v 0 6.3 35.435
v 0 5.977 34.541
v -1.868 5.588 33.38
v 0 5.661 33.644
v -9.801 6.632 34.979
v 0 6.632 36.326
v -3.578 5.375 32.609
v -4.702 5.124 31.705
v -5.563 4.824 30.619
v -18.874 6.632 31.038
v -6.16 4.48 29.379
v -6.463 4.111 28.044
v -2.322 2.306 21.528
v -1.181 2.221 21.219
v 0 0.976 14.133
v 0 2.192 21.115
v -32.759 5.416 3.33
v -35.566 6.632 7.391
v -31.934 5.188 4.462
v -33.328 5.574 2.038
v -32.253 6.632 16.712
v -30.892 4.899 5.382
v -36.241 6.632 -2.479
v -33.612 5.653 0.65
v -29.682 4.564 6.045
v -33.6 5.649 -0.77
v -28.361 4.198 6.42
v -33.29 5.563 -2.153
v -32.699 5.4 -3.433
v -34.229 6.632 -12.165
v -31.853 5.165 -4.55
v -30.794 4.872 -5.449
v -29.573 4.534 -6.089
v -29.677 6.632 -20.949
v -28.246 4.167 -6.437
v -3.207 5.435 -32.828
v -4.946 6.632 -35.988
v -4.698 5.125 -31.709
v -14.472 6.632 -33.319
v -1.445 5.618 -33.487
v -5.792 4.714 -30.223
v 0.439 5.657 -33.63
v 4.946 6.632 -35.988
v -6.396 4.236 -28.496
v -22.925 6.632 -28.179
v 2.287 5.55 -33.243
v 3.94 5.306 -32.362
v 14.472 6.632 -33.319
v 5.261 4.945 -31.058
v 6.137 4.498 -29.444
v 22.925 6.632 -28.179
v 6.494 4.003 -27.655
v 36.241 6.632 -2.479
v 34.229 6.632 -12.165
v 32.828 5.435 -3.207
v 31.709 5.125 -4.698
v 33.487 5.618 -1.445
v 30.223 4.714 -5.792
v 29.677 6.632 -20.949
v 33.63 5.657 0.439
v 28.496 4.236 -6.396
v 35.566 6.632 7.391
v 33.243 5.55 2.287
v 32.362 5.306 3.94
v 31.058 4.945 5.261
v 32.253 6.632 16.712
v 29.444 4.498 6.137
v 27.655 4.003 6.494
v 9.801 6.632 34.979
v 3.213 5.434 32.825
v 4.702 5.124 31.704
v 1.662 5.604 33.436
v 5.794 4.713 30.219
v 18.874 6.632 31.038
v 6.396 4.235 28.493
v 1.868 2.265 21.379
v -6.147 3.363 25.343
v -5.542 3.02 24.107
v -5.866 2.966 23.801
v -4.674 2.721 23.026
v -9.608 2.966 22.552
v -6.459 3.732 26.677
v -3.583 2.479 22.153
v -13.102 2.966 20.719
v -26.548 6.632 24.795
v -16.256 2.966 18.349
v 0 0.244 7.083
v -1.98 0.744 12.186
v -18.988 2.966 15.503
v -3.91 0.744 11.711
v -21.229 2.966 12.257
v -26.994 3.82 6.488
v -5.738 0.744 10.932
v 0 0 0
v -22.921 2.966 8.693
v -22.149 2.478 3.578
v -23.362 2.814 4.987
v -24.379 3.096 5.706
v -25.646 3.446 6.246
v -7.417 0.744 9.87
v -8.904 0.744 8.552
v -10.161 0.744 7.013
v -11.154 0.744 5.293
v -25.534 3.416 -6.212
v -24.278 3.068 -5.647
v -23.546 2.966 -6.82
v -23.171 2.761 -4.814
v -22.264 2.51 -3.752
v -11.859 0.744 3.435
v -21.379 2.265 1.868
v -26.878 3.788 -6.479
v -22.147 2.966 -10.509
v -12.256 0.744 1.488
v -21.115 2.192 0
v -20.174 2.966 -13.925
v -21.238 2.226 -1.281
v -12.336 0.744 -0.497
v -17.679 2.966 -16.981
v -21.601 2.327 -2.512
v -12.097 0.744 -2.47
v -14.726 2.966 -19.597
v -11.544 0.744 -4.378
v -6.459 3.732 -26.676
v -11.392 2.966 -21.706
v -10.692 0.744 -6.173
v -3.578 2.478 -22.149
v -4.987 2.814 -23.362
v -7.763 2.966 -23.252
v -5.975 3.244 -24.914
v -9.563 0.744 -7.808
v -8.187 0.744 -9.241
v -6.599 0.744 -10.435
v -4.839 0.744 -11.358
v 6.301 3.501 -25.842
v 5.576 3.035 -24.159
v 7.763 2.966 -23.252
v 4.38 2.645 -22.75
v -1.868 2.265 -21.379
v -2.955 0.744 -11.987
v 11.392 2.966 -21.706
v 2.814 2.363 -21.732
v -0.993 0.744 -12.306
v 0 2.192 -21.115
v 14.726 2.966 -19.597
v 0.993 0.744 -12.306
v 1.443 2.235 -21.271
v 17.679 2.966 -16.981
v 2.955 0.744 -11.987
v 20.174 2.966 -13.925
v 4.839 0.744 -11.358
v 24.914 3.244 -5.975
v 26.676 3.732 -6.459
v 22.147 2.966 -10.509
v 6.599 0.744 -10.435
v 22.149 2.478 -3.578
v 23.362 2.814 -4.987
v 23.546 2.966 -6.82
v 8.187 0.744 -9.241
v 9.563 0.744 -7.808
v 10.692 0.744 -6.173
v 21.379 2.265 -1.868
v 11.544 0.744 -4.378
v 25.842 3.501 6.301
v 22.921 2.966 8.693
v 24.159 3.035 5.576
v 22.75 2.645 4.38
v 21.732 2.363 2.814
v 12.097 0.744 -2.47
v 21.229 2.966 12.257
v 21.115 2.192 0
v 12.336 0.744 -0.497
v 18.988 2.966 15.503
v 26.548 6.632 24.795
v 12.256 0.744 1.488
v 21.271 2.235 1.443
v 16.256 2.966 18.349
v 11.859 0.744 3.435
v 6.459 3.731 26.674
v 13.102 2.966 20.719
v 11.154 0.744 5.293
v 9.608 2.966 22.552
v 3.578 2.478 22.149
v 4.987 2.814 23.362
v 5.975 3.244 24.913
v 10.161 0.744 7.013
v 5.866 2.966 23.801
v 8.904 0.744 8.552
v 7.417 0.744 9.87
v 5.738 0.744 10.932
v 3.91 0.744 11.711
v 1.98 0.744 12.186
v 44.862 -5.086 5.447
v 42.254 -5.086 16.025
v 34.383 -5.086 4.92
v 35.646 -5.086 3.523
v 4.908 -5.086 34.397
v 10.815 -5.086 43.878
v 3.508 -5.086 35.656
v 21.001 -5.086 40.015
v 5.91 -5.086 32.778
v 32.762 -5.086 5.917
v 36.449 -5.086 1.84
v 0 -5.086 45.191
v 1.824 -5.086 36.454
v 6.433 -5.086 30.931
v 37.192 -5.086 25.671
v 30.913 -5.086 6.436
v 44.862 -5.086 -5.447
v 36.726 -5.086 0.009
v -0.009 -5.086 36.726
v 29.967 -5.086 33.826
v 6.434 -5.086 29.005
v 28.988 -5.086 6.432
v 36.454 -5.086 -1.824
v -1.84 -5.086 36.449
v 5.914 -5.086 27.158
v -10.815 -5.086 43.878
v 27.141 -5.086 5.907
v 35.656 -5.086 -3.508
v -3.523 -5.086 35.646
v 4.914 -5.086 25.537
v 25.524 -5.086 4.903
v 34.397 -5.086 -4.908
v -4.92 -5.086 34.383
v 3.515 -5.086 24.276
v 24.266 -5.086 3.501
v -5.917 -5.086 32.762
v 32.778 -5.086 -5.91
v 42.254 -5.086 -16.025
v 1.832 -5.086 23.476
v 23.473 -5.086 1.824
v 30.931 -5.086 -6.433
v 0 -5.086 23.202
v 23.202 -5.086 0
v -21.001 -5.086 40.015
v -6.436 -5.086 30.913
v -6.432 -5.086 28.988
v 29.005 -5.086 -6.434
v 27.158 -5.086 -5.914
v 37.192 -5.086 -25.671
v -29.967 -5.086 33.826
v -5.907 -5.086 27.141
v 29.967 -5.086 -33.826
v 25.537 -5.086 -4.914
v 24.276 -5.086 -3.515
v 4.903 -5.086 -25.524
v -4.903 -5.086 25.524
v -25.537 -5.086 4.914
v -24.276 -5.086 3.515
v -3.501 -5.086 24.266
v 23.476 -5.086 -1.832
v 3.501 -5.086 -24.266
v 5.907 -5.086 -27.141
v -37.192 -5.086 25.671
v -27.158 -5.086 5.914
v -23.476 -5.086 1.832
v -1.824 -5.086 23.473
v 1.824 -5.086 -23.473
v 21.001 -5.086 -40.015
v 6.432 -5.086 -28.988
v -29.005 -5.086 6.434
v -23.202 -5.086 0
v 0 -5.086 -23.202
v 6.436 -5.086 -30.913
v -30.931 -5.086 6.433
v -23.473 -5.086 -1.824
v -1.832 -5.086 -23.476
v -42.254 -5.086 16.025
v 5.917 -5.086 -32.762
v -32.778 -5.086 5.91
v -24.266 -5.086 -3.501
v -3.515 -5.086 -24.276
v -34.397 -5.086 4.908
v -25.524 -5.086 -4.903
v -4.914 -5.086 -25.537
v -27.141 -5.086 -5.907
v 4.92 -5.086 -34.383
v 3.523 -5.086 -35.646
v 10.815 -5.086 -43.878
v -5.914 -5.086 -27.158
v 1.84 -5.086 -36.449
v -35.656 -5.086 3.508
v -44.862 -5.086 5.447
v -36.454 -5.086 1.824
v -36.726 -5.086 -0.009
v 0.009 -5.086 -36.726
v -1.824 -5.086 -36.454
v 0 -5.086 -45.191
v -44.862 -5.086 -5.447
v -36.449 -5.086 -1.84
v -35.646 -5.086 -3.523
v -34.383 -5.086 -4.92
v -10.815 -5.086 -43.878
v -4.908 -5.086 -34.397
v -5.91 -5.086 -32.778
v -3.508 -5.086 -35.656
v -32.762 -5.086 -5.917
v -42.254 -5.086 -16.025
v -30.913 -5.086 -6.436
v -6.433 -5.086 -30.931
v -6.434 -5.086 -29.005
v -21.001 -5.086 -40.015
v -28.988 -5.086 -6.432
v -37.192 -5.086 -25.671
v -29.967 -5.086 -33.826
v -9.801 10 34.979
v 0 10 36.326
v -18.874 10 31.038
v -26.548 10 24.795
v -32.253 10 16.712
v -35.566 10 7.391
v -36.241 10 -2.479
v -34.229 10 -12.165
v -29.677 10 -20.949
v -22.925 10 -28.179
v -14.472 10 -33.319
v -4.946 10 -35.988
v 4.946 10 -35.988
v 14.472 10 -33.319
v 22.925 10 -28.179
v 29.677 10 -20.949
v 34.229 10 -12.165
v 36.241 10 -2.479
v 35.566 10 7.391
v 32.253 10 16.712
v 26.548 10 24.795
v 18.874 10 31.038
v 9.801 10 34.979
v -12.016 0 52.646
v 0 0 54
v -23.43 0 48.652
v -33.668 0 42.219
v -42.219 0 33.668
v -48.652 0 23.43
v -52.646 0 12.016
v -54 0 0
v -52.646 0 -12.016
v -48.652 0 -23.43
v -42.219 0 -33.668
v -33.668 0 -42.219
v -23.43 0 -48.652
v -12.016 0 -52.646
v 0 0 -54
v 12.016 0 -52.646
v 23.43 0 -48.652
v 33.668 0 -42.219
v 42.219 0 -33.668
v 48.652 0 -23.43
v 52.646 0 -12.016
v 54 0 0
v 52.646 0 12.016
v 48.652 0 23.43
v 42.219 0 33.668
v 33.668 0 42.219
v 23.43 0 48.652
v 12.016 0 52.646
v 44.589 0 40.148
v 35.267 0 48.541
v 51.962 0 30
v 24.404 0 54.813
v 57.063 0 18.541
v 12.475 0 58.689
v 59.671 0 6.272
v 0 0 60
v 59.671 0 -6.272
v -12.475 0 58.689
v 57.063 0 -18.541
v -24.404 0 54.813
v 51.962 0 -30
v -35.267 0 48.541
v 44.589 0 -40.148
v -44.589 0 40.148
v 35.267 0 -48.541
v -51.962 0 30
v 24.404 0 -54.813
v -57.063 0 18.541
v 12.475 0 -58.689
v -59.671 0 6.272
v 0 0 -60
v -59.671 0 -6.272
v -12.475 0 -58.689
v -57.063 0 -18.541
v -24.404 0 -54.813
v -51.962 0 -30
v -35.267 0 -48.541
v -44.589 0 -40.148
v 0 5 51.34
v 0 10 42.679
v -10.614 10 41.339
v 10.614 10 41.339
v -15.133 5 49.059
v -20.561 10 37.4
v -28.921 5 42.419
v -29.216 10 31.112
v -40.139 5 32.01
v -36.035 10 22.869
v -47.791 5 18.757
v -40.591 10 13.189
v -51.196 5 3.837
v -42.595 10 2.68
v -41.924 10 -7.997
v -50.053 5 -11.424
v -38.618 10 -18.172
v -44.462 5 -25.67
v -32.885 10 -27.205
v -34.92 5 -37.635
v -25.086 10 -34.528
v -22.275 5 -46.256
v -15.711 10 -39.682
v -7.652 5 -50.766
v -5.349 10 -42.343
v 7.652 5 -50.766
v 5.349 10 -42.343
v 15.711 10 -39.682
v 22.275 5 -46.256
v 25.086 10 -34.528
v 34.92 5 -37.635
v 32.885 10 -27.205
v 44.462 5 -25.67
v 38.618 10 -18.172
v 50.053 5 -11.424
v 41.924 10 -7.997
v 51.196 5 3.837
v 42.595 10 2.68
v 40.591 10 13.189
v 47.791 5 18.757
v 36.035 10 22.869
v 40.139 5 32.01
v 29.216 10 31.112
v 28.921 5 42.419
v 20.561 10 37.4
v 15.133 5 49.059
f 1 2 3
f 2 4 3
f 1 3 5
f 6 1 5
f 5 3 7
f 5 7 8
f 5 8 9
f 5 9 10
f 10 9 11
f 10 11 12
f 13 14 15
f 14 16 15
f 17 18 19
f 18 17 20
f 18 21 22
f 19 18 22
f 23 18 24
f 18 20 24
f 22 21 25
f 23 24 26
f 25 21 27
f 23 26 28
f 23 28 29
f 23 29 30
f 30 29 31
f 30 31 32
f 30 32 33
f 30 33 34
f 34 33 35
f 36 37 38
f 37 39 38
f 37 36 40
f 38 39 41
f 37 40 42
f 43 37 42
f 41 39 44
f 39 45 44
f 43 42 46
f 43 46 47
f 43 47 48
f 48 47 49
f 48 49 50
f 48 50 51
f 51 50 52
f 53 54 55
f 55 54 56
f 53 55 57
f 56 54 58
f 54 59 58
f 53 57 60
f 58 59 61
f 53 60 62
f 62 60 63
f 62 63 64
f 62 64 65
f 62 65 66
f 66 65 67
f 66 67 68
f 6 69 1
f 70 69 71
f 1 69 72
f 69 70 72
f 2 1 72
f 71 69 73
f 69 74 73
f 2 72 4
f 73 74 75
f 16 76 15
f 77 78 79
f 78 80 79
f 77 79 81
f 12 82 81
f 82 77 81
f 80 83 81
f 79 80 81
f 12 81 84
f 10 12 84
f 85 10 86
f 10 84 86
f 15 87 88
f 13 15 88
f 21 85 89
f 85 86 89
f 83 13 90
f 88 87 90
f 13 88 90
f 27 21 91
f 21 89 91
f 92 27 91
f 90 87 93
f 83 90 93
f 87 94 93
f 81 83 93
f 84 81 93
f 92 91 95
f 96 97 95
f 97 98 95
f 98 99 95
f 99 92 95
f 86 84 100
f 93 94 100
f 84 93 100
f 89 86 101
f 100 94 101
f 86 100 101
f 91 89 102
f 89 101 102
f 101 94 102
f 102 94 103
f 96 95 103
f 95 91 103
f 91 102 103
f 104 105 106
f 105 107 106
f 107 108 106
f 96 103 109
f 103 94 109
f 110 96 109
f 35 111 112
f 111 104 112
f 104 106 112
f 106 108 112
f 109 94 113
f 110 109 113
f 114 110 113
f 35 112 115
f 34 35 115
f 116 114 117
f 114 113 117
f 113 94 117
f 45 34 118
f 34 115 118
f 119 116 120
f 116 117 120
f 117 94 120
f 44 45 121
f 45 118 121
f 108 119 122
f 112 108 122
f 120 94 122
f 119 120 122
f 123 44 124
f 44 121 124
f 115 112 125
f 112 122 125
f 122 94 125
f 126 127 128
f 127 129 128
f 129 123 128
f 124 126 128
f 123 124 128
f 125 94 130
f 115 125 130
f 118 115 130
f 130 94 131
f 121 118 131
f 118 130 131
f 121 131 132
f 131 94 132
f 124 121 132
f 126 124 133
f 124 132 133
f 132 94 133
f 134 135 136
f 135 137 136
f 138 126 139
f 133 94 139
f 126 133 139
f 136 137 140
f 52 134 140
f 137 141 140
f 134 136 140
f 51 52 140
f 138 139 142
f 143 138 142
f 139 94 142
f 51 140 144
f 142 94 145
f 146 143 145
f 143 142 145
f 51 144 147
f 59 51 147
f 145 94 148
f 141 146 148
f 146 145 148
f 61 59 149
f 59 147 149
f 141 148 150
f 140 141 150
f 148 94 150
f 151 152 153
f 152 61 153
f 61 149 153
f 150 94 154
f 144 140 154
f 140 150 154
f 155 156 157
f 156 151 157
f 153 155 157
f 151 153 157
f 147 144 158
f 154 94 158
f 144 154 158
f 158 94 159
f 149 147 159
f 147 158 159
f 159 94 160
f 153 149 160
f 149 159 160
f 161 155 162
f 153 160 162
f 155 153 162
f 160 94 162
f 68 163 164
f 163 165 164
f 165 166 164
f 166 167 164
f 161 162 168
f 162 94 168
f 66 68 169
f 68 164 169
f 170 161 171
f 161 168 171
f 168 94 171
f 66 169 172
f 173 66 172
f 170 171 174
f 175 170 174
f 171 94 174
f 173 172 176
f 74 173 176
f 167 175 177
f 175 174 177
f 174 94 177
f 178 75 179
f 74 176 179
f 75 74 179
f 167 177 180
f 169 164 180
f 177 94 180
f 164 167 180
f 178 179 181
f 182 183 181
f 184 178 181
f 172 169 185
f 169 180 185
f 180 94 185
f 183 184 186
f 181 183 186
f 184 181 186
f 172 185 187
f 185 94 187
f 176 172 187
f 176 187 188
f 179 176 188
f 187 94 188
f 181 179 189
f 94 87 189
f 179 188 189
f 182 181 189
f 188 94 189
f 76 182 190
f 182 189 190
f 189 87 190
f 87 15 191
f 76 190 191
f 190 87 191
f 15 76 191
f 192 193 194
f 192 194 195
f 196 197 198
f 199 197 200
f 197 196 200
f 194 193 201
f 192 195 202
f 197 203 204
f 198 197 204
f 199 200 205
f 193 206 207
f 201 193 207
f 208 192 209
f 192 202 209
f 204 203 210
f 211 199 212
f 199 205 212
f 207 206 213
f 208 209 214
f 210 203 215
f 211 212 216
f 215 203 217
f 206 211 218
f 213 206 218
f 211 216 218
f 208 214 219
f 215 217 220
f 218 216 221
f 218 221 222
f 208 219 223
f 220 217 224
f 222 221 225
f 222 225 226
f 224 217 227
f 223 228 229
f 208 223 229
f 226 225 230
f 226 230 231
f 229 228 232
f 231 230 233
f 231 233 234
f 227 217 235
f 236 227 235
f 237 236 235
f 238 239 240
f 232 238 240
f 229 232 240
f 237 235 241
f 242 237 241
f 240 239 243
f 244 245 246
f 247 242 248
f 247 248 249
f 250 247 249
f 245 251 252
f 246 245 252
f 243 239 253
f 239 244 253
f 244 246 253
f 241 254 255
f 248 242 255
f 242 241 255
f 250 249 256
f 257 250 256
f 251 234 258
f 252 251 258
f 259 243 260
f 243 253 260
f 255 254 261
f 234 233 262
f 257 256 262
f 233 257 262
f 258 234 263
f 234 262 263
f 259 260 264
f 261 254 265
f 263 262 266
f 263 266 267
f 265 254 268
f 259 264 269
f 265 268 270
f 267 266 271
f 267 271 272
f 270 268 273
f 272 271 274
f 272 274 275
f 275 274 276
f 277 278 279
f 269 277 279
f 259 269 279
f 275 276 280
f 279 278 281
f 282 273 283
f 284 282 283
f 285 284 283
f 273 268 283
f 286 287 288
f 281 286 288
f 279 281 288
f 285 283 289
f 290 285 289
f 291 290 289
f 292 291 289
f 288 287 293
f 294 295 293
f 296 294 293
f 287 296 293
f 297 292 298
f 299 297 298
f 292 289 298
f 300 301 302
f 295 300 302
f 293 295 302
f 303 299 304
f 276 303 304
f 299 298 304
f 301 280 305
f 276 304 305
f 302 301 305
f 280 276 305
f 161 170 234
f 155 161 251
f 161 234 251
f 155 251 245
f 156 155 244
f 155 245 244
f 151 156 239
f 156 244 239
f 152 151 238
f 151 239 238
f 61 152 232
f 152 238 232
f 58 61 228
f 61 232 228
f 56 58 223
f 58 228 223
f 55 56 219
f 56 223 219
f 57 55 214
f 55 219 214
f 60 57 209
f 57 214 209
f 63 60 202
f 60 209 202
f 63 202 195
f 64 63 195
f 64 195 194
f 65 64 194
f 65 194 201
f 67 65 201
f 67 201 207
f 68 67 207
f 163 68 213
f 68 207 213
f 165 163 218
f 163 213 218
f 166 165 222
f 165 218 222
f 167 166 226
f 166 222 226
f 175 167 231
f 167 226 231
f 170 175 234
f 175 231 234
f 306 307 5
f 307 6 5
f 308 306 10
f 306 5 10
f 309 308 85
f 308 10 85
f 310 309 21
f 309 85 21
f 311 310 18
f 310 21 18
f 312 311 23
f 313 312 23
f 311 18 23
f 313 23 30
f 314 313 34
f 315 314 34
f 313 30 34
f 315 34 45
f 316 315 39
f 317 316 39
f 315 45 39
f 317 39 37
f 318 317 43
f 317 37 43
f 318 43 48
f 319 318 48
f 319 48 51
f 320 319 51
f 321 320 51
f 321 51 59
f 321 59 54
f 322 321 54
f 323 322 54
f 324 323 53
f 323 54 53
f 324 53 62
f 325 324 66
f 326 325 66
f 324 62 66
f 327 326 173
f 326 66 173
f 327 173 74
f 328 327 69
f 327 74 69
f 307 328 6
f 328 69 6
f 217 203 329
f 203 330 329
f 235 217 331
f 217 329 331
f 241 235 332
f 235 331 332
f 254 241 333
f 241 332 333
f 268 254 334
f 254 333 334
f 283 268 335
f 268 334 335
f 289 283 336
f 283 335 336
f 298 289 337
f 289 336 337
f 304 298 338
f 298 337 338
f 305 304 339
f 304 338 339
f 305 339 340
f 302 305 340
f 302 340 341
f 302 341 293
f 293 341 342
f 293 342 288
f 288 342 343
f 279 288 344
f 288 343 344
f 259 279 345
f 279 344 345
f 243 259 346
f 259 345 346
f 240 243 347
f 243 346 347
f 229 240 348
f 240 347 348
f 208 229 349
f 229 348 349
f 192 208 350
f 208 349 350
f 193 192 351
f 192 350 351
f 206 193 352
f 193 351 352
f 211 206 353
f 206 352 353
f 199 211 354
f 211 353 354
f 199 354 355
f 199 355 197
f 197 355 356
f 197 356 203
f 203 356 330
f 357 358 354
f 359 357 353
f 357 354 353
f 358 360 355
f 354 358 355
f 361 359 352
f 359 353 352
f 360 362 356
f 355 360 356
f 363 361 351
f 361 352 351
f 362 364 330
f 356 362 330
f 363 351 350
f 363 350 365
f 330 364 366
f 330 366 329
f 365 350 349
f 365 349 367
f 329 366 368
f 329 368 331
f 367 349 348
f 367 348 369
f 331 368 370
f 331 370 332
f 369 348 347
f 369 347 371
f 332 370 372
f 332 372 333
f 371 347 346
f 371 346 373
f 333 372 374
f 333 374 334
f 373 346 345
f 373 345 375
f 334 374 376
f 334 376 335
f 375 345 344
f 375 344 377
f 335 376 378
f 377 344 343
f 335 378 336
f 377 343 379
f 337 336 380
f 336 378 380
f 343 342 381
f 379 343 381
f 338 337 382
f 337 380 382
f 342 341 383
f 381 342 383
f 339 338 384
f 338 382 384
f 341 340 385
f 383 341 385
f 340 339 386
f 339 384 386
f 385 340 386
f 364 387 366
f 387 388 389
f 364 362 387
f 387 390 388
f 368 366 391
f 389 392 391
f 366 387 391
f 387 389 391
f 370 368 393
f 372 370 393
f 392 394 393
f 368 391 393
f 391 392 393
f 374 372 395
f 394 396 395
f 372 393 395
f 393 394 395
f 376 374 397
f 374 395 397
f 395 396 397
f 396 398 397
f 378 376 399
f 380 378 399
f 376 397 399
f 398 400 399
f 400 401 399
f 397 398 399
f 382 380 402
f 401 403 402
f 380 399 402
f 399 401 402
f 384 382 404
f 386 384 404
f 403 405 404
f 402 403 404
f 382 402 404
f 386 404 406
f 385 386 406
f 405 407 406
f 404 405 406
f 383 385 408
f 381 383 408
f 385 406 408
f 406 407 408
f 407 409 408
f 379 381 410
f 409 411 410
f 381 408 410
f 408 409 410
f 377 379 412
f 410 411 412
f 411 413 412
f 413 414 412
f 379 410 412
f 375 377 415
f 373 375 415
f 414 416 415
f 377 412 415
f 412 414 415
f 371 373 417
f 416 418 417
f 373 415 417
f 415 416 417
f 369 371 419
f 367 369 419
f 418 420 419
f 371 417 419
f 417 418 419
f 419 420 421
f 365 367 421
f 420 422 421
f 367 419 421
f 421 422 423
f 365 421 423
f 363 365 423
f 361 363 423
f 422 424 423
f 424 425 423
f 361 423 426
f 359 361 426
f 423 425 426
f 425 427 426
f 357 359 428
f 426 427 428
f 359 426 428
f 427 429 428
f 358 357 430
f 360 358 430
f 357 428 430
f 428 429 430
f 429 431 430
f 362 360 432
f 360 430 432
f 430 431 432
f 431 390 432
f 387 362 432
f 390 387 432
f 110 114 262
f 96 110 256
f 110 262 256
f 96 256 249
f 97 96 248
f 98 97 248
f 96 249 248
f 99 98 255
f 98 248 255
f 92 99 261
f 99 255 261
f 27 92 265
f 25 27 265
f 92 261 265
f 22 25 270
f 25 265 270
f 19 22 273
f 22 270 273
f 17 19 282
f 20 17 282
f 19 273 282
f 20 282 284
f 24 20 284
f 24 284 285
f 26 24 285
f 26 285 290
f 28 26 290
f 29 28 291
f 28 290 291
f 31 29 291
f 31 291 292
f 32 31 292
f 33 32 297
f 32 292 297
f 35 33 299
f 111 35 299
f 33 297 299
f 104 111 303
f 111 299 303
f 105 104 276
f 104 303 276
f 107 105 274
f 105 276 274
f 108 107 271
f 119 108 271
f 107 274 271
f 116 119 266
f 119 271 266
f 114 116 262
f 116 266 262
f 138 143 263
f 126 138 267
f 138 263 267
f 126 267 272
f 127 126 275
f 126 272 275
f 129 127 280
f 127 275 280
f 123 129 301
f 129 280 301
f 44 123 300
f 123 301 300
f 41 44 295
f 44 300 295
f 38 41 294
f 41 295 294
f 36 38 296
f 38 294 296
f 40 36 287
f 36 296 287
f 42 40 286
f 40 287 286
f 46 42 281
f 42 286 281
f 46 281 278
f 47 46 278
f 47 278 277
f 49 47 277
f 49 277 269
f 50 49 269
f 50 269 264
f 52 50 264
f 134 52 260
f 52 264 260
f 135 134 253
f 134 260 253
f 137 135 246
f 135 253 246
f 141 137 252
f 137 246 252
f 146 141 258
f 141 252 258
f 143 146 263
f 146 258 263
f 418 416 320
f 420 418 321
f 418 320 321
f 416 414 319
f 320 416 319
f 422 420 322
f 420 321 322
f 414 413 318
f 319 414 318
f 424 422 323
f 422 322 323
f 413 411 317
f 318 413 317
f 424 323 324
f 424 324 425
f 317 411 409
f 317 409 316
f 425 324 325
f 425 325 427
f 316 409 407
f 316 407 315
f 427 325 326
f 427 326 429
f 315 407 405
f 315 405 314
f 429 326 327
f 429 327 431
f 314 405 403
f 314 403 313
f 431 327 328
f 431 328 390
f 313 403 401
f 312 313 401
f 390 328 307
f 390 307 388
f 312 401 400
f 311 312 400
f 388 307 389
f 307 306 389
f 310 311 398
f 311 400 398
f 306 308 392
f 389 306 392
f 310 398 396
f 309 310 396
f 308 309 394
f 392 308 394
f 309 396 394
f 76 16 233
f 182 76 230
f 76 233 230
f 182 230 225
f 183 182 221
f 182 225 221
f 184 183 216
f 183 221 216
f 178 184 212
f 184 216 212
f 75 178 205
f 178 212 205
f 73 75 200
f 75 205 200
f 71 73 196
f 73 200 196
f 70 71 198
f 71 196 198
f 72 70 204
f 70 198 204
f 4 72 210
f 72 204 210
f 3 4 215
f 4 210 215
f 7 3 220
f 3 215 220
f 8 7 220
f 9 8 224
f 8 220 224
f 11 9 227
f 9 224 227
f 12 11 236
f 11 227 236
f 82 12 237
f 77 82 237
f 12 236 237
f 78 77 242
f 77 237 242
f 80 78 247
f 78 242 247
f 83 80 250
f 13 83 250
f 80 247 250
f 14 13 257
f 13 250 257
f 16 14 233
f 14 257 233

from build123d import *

# Parameters (mm, degrees)
PATTERN_CIRCULAR_1_COUNT = 4


with BuildPart() as part:
    # 草图1 → 旋转1 (revolve)
    with BuildSketch(Plane(origin=(0, 0, 0), x_dir=(0, 0, -1), z_dir=(1, 0, 0)), mode=Mode.PRIVATE) as revolve_1_sk:
        with BuildLine():
            Line((60, 0), (42.679491924, 10))
            Line((42.679491924, 10), (36.32612495, 10))
            Line((36.32612495, 10), (36.32612495, 6.632164181))
            ThreePointArc((36.32612495, 6.632164181), (18.463294368, 1.671632263), (0, 0))
            Line((0, 0), (0, -5.085825136))
            Line((0, -5.085825136), (45.191092466, -5.085825136))
            Line((45.191092466, -5.085825136), (54, 0))
            Line((54, 0), (60, 0))
        make_face()
    revolve(revolve_1_sk.sketch.rotate(Axis((0, 23.869545483, 0), (0, -1, 0)), 180), axis=Axis((0, 23.869545483, 0), (0, -1, 0)))

    # 草图2 → 切除-旋转1 (revolve, cut)
    with BuildSketch(Plane.XY, mode=Mode.PRIVATE) as cut_revolve_1_sk:
        Polygon((23.11658969, 18.792484499), (29.364790714, 20.584127312), (39.564082896, -14.98503156), (33.315881872, -16.776674373), align=None)
    cut_revolve_1 = revolve(cut_revolve_1_sk.sketch.rotate(Axis((0, 99.409613277, 0), (0.2756373558169999, -0.9612616959383187, 0)), 180), axis=Axis((0, 99.409613277, 0), (0.2756373558169999, -0.9612616959383187, 0)), mode=Mode.SUBTRACT)

    # 阵列(圆周)1: 切除-旋转1 ×4 about axis
    pattern_circular_1_axis = Axis((0, 6.632164181, 0), (0, 1, 0))
    for i in range(1, PATTERN_CIRCULAR_1_COUNT):
        add(cut_revolve_1.rotate(pattern_circular_1_axis, i * 360 / PATTERN_CIRCULAR_1_COUNT), mode=Mode.SUBTRACT)


solid = part.part
